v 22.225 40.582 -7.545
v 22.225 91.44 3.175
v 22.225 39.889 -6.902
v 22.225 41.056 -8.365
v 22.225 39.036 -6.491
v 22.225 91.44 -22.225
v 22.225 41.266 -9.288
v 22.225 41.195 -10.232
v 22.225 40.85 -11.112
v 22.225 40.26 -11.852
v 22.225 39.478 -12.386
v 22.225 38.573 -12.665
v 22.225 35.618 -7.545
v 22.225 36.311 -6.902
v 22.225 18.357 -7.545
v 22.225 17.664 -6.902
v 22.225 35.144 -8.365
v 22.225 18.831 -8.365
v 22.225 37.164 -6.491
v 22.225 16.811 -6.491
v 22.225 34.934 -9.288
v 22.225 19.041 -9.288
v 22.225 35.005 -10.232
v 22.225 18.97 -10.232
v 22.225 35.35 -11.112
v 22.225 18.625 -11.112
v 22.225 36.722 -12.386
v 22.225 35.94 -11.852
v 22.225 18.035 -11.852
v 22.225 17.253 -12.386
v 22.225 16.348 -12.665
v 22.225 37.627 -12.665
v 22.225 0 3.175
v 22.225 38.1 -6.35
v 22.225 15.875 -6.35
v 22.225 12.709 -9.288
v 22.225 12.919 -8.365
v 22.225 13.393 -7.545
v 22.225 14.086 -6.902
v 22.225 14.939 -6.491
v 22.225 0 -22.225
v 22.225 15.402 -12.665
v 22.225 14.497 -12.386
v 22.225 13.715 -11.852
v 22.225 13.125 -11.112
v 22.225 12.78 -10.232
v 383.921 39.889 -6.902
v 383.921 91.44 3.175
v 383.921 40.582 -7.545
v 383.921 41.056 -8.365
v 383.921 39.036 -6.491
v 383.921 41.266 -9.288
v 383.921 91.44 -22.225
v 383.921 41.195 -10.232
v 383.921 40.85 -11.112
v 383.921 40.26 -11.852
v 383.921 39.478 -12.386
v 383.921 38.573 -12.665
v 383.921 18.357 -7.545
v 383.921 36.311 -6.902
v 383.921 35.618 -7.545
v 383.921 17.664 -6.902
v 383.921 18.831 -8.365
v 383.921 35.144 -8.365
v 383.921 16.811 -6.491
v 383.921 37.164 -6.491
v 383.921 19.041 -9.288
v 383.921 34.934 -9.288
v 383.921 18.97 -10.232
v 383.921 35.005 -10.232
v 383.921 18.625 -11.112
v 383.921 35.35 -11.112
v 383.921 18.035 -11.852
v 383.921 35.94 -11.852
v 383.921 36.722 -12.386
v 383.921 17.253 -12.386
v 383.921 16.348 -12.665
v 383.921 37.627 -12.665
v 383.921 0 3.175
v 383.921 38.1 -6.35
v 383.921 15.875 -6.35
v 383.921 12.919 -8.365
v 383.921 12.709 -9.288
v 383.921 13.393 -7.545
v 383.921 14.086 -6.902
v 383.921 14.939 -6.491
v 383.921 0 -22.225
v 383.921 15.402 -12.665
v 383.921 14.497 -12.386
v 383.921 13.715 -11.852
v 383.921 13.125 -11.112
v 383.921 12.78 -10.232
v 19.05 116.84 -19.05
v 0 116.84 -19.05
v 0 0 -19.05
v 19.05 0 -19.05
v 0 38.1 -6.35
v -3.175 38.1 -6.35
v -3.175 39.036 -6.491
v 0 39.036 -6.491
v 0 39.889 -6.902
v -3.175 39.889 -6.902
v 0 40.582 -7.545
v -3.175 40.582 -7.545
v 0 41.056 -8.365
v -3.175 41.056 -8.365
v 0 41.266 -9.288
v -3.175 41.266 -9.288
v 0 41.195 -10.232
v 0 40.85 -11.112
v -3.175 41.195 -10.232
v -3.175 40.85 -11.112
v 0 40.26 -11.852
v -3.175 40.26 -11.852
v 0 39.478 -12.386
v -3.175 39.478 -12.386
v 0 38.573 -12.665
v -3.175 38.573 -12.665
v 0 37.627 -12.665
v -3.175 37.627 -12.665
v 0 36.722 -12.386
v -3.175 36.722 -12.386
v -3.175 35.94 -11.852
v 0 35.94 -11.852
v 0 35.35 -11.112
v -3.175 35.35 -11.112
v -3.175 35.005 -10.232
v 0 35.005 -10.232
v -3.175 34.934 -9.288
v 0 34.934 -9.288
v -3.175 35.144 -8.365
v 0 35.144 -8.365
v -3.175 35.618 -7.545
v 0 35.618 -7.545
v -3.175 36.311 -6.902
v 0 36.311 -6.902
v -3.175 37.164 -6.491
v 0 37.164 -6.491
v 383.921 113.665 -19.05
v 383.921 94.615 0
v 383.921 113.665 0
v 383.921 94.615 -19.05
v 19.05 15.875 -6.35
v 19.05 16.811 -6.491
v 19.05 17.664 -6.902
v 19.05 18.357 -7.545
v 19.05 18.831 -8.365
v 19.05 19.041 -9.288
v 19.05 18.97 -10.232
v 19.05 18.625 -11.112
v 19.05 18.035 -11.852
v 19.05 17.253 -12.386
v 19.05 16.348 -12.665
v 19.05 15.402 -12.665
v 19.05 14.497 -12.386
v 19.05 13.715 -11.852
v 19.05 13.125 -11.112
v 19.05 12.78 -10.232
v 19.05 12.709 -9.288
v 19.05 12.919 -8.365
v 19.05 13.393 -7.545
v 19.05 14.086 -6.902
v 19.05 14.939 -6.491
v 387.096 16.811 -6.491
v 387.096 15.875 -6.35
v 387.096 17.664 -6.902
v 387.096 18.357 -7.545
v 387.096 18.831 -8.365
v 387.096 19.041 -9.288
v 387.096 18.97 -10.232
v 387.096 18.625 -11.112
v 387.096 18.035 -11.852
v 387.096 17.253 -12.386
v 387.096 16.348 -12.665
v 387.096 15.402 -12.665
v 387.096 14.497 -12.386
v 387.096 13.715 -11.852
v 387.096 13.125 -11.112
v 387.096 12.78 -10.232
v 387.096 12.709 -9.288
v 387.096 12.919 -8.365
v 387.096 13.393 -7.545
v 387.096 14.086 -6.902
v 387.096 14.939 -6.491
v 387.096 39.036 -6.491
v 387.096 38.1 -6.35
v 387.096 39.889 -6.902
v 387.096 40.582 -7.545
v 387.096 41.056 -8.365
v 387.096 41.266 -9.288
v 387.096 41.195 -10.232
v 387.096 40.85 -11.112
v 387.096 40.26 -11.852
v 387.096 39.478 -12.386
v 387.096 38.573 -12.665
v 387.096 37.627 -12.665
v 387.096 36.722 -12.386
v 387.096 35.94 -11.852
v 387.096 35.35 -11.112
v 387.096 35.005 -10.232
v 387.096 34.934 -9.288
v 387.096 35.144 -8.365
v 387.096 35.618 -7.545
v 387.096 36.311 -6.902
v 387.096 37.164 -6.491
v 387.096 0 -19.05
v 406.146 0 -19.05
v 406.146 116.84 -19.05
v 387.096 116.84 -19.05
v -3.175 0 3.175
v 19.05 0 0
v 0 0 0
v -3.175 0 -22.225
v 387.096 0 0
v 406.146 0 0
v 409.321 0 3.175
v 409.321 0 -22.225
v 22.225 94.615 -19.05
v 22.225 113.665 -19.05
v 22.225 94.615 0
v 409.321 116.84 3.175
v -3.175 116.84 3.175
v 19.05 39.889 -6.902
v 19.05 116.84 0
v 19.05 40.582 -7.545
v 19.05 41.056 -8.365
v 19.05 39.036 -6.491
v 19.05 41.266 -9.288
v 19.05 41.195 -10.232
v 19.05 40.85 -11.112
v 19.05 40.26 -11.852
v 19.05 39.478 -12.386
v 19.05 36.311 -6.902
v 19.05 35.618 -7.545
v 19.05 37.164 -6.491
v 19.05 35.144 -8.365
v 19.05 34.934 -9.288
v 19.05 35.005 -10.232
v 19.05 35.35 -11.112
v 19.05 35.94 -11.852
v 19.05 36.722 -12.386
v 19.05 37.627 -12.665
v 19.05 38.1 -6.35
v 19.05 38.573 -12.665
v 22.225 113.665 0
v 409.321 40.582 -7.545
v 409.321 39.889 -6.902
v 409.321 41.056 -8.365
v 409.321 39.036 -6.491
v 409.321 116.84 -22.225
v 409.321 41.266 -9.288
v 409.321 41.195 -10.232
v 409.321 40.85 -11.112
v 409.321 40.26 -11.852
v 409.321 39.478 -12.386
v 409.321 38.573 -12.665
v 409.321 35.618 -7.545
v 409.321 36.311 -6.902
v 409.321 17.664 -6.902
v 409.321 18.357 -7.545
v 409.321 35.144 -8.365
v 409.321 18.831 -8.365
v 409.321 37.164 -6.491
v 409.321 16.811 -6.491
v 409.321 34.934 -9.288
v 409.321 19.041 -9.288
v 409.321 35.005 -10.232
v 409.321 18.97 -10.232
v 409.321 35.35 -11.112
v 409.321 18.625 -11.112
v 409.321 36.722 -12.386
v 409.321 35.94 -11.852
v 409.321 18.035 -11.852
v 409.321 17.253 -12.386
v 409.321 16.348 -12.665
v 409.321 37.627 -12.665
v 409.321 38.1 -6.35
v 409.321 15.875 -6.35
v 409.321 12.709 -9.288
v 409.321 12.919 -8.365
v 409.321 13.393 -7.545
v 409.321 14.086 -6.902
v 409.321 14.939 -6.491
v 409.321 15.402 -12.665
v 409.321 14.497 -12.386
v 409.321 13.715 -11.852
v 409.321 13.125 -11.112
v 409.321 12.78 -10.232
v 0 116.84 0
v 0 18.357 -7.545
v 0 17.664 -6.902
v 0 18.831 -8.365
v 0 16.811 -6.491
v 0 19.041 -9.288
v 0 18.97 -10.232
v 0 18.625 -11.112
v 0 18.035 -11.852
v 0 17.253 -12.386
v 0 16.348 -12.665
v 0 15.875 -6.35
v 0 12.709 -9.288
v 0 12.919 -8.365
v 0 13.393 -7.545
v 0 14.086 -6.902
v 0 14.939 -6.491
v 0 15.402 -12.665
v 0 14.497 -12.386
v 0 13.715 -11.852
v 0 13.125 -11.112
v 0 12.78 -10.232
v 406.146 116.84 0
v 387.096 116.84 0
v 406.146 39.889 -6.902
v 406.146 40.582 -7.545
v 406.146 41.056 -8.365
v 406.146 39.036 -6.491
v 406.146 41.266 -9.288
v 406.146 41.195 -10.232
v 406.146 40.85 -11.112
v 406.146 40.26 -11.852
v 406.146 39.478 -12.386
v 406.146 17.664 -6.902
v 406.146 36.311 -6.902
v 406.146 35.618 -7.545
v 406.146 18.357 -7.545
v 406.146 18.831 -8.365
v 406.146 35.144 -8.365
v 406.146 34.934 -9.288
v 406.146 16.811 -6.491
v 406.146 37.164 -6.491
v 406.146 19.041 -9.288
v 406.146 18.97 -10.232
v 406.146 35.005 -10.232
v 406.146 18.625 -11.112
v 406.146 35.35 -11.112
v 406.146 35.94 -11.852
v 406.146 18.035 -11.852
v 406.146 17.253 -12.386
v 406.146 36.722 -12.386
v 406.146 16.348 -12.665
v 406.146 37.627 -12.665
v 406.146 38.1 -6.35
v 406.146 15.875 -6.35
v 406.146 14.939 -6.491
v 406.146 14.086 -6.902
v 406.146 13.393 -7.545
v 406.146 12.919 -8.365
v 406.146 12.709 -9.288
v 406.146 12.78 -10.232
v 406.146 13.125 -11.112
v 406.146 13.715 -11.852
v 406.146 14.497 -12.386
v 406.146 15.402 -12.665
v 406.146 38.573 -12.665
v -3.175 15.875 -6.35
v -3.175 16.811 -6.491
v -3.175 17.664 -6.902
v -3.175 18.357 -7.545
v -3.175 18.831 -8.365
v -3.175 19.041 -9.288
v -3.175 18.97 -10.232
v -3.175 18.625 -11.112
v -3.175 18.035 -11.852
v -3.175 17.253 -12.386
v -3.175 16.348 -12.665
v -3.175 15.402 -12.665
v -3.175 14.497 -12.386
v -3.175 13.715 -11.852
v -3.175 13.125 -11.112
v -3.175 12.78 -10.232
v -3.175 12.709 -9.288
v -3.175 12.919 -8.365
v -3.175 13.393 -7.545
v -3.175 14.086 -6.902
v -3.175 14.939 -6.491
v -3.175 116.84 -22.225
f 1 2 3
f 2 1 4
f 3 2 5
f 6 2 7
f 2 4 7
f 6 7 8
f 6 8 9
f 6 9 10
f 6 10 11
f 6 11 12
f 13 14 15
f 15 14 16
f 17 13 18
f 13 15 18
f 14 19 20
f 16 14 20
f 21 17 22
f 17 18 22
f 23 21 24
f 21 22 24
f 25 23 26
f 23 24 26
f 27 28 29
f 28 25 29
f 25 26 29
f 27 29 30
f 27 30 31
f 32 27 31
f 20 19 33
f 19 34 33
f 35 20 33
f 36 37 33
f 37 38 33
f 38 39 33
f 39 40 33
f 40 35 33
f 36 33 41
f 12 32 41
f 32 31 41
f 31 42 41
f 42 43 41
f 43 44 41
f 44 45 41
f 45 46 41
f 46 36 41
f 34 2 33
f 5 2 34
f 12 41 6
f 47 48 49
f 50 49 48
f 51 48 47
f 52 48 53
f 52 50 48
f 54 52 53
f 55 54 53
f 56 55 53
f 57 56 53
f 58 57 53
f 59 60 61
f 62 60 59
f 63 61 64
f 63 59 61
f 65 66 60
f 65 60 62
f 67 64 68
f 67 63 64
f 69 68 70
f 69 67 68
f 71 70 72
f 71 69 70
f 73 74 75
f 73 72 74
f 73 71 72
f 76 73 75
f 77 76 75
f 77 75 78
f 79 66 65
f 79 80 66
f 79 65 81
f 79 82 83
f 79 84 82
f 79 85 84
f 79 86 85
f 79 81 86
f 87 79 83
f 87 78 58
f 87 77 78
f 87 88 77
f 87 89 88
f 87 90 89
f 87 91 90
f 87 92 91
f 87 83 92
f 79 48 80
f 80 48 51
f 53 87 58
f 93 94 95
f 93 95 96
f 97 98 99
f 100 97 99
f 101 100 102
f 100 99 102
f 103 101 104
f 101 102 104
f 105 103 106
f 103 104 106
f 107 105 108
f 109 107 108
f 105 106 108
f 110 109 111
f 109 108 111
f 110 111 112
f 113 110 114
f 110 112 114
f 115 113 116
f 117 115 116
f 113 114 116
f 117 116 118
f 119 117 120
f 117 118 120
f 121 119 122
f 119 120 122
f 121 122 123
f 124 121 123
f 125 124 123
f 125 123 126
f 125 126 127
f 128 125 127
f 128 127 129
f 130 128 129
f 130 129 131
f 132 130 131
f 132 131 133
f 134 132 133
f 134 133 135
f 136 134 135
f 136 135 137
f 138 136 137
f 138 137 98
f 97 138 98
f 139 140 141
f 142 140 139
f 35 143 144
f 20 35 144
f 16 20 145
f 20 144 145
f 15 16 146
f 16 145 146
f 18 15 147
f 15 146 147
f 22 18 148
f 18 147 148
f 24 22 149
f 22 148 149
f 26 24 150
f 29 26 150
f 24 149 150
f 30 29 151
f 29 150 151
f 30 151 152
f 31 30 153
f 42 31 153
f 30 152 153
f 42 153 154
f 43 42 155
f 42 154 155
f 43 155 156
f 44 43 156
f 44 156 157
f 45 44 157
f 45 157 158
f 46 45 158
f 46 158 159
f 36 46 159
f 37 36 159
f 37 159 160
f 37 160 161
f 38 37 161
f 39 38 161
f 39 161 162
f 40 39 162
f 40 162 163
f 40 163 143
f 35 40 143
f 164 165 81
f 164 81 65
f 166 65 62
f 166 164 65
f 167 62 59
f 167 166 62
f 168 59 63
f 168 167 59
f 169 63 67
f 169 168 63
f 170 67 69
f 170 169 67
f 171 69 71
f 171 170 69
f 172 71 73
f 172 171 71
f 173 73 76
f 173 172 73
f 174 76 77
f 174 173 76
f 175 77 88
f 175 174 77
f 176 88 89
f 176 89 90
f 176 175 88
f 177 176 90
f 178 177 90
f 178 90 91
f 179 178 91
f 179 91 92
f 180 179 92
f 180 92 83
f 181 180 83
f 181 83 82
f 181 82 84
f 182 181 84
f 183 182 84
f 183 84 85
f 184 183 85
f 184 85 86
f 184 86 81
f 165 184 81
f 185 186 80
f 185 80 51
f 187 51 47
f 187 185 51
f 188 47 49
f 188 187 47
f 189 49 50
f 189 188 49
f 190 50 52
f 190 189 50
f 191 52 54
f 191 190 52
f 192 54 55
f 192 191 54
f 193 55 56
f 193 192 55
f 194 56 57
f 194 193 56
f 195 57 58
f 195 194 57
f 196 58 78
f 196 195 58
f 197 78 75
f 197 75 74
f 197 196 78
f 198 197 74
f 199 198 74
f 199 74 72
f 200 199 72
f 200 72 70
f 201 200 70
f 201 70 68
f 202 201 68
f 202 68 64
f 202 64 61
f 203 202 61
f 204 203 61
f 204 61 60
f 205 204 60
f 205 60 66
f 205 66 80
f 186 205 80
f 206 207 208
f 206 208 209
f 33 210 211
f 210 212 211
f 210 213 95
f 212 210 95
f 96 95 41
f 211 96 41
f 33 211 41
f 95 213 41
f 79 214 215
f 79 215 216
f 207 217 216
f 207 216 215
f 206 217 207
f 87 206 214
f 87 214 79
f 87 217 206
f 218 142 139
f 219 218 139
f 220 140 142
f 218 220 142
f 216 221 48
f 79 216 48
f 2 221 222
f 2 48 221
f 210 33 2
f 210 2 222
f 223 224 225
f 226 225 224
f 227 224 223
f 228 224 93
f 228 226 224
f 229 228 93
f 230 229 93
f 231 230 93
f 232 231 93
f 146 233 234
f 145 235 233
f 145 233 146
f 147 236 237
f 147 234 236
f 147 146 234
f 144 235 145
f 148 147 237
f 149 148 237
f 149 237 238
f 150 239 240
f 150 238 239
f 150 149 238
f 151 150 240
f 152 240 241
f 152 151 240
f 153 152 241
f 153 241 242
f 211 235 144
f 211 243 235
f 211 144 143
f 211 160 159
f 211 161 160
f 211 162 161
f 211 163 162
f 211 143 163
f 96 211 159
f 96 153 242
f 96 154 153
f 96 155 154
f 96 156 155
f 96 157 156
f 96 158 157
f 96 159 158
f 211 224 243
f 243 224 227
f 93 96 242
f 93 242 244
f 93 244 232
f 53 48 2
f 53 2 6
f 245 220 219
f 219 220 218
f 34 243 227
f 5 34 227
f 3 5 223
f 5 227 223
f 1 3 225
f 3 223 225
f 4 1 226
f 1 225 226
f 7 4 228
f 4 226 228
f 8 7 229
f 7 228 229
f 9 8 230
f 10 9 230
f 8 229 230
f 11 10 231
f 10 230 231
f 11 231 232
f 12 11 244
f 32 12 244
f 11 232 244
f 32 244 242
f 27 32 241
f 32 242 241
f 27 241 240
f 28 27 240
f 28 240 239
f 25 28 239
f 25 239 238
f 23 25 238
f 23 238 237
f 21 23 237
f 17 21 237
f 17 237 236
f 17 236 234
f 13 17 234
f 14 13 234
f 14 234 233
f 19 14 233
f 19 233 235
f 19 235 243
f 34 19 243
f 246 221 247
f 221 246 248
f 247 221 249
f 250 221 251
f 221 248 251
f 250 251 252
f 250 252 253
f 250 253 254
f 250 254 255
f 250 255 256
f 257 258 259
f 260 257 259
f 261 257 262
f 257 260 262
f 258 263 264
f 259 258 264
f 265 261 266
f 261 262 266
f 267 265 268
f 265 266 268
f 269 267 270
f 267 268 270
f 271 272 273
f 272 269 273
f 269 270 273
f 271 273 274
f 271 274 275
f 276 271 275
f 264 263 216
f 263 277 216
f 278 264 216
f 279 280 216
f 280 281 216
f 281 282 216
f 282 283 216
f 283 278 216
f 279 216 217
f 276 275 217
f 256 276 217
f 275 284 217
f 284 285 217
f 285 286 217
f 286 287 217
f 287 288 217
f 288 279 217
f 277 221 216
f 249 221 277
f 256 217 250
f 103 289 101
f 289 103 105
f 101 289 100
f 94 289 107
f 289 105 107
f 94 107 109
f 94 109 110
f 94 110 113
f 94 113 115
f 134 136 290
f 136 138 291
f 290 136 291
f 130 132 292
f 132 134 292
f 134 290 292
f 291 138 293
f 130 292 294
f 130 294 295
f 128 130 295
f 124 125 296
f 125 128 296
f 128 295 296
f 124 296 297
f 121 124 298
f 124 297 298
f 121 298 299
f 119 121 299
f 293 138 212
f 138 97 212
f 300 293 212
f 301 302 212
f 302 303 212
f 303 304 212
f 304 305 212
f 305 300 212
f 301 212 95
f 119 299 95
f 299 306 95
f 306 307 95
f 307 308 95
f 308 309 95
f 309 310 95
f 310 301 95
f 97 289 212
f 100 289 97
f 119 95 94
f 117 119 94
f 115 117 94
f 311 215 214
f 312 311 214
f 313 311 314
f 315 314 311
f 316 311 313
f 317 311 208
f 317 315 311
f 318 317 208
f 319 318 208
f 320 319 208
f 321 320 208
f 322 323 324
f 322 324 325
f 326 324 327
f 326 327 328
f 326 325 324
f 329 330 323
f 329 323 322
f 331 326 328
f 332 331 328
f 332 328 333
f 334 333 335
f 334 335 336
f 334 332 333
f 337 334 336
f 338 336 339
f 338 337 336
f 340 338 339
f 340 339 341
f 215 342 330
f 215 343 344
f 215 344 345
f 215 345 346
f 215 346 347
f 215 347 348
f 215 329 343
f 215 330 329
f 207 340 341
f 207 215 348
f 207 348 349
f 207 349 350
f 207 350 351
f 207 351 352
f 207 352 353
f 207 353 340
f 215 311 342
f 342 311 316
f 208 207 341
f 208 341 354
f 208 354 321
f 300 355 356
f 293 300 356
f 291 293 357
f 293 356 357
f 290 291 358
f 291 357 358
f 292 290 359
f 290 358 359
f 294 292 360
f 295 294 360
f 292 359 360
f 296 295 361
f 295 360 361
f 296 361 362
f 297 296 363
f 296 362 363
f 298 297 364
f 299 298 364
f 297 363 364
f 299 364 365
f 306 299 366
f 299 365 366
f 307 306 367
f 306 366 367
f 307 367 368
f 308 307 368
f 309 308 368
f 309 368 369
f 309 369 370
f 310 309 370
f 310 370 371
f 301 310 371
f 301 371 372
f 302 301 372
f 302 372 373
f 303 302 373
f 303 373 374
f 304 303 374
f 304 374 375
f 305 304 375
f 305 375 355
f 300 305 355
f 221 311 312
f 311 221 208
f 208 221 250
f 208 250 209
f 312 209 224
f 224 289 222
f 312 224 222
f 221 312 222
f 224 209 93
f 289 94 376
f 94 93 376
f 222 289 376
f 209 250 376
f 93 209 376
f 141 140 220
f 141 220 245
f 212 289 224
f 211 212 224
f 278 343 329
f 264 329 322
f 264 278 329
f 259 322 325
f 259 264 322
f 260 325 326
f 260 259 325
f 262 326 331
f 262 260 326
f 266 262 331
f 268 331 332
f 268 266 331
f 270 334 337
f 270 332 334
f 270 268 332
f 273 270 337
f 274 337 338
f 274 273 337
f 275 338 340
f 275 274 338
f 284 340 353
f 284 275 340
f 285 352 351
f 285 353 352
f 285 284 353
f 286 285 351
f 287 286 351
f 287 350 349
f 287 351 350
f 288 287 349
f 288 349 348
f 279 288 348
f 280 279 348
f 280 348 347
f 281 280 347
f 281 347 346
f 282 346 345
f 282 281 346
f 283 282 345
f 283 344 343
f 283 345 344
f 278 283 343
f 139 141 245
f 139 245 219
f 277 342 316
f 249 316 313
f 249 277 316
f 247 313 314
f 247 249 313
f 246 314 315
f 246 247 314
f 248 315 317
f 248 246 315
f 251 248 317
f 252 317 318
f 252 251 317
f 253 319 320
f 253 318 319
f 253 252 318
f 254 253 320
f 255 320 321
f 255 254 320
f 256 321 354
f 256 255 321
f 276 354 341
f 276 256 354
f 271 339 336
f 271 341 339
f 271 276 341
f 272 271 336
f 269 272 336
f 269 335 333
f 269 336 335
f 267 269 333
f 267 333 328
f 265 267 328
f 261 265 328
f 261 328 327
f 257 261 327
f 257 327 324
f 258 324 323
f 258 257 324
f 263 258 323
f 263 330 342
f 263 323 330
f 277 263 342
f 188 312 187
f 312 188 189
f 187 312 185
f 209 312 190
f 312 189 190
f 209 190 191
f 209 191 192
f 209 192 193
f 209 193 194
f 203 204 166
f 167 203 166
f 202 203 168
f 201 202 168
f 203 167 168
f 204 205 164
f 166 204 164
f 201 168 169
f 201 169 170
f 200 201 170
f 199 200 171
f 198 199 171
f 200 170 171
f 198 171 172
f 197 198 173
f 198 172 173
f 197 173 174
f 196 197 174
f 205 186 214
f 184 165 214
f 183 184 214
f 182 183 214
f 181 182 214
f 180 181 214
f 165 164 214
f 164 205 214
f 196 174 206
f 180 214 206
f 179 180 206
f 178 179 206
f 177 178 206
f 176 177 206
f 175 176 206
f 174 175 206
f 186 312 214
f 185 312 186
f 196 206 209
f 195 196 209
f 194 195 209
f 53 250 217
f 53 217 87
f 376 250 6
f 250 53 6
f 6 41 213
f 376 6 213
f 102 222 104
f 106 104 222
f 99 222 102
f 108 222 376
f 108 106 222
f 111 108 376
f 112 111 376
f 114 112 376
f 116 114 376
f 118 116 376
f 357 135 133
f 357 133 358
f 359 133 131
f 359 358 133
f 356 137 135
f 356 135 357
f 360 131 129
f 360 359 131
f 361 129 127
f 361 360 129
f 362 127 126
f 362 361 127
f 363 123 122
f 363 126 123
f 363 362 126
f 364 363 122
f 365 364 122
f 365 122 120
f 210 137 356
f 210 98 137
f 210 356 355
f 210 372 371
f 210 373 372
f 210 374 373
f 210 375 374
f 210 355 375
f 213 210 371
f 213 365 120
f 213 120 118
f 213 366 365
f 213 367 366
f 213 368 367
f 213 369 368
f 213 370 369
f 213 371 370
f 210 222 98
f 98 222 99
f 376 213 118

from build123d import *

# Parameters (mm, degrees)
SKETCH1_W           = 25.4
SKETCH1_H           = 25.4
SKETCH1_W_2         = 19.05
SKETCH1_H_2         = 19.05
BOSS_EXTRUDE1_DEPTH = 116.84
SKETCH2_R           = 3.175
CUT_EXTRUDE1_DEPTH  = 25.4
SKETCH4_W           = 25.4
SKETCH4_H           = 25.4
SKETCH4_W_2         = 19.05
SKETCH4_H_2         = 19.05
BOSS_EXTRUDE2_DEPTH = 180.848


with BuildPart() as part:
    # Sketch1 → Boss-Extrude1 (new body)
    with BuildSketch(Plane(origin=(0, 0, 0), x_dir=(1, 0, 0), z_dir=(0, 1, 0))):
        with Locations((9.525, 9.525)):
            Rectangle(SKETCH1_W, SKETCH1_H)
        with Locations((9.525, 9.525)):
            Rectangle(SKETCH1_W_2, SKETCH1_H_2, mode=Mode.SUBTRACT)
    boss_extrude1 = extrude(amount=BOSS_EXTRUDE1_DEPTH)

    # Sketch2 → Cut-Extrude1 (cut)
    with BuildSketch(Plane.ZY.offset(3.175)):
        with Locations((-9.525, 15.875)):
            Circle(SKETCH2_R)
        with Locations((-9.525, 38.1)):
            Circle(SKETCH2_R)
    cut_extrude1 = extrude(amount=-CUT_EXTRUDE1_DEPTH, mode=Mode.SUBTRACT)

    # Sketch4 → Boss-Extrude2 (add)
    with BuildSketch(Plane(origin=(22.225, 0, 0), x_dir=(0, 0, -1), z_dir=(1, 0, 0))):
        with Locations((9.525, 104.14)):
            Rectangle(SKETCH4_W, SKETCH4_H)
        with Locations((9.525, 104.14)):
            Rectangle(SKETCH4_W_2, SKETCH4_H_2, mode=Mode.SUBTRACT)
    boss_extrude2 = extrude(amount=BOSS_EXTRUDE2_DEPTH)

    # Mirror2: Boss-Extrude2 across plane
    add(boss_extrude2.mirror(Plane(origin=(203.073, 0, 0), x_dir=(0, 0, 1), z_dir=(1, 0, 0))))

    # Mirror4: Boss-Extrude1, Cut-Extrude1 across plane
    add(boss_extrude1.mirror(Plane(origin=(203.073, 0, 0), x_dir=(0, 0, 1), z_dir=(1, 0, 0))))
    add(cut_extrude1.mirror(Plane(origin=(203.073, 0, 0), x_dir=(0, 0, 1), z_dir=(1, 0, 0))), mode=Mode.SUBTRACT)


solid = part.part
